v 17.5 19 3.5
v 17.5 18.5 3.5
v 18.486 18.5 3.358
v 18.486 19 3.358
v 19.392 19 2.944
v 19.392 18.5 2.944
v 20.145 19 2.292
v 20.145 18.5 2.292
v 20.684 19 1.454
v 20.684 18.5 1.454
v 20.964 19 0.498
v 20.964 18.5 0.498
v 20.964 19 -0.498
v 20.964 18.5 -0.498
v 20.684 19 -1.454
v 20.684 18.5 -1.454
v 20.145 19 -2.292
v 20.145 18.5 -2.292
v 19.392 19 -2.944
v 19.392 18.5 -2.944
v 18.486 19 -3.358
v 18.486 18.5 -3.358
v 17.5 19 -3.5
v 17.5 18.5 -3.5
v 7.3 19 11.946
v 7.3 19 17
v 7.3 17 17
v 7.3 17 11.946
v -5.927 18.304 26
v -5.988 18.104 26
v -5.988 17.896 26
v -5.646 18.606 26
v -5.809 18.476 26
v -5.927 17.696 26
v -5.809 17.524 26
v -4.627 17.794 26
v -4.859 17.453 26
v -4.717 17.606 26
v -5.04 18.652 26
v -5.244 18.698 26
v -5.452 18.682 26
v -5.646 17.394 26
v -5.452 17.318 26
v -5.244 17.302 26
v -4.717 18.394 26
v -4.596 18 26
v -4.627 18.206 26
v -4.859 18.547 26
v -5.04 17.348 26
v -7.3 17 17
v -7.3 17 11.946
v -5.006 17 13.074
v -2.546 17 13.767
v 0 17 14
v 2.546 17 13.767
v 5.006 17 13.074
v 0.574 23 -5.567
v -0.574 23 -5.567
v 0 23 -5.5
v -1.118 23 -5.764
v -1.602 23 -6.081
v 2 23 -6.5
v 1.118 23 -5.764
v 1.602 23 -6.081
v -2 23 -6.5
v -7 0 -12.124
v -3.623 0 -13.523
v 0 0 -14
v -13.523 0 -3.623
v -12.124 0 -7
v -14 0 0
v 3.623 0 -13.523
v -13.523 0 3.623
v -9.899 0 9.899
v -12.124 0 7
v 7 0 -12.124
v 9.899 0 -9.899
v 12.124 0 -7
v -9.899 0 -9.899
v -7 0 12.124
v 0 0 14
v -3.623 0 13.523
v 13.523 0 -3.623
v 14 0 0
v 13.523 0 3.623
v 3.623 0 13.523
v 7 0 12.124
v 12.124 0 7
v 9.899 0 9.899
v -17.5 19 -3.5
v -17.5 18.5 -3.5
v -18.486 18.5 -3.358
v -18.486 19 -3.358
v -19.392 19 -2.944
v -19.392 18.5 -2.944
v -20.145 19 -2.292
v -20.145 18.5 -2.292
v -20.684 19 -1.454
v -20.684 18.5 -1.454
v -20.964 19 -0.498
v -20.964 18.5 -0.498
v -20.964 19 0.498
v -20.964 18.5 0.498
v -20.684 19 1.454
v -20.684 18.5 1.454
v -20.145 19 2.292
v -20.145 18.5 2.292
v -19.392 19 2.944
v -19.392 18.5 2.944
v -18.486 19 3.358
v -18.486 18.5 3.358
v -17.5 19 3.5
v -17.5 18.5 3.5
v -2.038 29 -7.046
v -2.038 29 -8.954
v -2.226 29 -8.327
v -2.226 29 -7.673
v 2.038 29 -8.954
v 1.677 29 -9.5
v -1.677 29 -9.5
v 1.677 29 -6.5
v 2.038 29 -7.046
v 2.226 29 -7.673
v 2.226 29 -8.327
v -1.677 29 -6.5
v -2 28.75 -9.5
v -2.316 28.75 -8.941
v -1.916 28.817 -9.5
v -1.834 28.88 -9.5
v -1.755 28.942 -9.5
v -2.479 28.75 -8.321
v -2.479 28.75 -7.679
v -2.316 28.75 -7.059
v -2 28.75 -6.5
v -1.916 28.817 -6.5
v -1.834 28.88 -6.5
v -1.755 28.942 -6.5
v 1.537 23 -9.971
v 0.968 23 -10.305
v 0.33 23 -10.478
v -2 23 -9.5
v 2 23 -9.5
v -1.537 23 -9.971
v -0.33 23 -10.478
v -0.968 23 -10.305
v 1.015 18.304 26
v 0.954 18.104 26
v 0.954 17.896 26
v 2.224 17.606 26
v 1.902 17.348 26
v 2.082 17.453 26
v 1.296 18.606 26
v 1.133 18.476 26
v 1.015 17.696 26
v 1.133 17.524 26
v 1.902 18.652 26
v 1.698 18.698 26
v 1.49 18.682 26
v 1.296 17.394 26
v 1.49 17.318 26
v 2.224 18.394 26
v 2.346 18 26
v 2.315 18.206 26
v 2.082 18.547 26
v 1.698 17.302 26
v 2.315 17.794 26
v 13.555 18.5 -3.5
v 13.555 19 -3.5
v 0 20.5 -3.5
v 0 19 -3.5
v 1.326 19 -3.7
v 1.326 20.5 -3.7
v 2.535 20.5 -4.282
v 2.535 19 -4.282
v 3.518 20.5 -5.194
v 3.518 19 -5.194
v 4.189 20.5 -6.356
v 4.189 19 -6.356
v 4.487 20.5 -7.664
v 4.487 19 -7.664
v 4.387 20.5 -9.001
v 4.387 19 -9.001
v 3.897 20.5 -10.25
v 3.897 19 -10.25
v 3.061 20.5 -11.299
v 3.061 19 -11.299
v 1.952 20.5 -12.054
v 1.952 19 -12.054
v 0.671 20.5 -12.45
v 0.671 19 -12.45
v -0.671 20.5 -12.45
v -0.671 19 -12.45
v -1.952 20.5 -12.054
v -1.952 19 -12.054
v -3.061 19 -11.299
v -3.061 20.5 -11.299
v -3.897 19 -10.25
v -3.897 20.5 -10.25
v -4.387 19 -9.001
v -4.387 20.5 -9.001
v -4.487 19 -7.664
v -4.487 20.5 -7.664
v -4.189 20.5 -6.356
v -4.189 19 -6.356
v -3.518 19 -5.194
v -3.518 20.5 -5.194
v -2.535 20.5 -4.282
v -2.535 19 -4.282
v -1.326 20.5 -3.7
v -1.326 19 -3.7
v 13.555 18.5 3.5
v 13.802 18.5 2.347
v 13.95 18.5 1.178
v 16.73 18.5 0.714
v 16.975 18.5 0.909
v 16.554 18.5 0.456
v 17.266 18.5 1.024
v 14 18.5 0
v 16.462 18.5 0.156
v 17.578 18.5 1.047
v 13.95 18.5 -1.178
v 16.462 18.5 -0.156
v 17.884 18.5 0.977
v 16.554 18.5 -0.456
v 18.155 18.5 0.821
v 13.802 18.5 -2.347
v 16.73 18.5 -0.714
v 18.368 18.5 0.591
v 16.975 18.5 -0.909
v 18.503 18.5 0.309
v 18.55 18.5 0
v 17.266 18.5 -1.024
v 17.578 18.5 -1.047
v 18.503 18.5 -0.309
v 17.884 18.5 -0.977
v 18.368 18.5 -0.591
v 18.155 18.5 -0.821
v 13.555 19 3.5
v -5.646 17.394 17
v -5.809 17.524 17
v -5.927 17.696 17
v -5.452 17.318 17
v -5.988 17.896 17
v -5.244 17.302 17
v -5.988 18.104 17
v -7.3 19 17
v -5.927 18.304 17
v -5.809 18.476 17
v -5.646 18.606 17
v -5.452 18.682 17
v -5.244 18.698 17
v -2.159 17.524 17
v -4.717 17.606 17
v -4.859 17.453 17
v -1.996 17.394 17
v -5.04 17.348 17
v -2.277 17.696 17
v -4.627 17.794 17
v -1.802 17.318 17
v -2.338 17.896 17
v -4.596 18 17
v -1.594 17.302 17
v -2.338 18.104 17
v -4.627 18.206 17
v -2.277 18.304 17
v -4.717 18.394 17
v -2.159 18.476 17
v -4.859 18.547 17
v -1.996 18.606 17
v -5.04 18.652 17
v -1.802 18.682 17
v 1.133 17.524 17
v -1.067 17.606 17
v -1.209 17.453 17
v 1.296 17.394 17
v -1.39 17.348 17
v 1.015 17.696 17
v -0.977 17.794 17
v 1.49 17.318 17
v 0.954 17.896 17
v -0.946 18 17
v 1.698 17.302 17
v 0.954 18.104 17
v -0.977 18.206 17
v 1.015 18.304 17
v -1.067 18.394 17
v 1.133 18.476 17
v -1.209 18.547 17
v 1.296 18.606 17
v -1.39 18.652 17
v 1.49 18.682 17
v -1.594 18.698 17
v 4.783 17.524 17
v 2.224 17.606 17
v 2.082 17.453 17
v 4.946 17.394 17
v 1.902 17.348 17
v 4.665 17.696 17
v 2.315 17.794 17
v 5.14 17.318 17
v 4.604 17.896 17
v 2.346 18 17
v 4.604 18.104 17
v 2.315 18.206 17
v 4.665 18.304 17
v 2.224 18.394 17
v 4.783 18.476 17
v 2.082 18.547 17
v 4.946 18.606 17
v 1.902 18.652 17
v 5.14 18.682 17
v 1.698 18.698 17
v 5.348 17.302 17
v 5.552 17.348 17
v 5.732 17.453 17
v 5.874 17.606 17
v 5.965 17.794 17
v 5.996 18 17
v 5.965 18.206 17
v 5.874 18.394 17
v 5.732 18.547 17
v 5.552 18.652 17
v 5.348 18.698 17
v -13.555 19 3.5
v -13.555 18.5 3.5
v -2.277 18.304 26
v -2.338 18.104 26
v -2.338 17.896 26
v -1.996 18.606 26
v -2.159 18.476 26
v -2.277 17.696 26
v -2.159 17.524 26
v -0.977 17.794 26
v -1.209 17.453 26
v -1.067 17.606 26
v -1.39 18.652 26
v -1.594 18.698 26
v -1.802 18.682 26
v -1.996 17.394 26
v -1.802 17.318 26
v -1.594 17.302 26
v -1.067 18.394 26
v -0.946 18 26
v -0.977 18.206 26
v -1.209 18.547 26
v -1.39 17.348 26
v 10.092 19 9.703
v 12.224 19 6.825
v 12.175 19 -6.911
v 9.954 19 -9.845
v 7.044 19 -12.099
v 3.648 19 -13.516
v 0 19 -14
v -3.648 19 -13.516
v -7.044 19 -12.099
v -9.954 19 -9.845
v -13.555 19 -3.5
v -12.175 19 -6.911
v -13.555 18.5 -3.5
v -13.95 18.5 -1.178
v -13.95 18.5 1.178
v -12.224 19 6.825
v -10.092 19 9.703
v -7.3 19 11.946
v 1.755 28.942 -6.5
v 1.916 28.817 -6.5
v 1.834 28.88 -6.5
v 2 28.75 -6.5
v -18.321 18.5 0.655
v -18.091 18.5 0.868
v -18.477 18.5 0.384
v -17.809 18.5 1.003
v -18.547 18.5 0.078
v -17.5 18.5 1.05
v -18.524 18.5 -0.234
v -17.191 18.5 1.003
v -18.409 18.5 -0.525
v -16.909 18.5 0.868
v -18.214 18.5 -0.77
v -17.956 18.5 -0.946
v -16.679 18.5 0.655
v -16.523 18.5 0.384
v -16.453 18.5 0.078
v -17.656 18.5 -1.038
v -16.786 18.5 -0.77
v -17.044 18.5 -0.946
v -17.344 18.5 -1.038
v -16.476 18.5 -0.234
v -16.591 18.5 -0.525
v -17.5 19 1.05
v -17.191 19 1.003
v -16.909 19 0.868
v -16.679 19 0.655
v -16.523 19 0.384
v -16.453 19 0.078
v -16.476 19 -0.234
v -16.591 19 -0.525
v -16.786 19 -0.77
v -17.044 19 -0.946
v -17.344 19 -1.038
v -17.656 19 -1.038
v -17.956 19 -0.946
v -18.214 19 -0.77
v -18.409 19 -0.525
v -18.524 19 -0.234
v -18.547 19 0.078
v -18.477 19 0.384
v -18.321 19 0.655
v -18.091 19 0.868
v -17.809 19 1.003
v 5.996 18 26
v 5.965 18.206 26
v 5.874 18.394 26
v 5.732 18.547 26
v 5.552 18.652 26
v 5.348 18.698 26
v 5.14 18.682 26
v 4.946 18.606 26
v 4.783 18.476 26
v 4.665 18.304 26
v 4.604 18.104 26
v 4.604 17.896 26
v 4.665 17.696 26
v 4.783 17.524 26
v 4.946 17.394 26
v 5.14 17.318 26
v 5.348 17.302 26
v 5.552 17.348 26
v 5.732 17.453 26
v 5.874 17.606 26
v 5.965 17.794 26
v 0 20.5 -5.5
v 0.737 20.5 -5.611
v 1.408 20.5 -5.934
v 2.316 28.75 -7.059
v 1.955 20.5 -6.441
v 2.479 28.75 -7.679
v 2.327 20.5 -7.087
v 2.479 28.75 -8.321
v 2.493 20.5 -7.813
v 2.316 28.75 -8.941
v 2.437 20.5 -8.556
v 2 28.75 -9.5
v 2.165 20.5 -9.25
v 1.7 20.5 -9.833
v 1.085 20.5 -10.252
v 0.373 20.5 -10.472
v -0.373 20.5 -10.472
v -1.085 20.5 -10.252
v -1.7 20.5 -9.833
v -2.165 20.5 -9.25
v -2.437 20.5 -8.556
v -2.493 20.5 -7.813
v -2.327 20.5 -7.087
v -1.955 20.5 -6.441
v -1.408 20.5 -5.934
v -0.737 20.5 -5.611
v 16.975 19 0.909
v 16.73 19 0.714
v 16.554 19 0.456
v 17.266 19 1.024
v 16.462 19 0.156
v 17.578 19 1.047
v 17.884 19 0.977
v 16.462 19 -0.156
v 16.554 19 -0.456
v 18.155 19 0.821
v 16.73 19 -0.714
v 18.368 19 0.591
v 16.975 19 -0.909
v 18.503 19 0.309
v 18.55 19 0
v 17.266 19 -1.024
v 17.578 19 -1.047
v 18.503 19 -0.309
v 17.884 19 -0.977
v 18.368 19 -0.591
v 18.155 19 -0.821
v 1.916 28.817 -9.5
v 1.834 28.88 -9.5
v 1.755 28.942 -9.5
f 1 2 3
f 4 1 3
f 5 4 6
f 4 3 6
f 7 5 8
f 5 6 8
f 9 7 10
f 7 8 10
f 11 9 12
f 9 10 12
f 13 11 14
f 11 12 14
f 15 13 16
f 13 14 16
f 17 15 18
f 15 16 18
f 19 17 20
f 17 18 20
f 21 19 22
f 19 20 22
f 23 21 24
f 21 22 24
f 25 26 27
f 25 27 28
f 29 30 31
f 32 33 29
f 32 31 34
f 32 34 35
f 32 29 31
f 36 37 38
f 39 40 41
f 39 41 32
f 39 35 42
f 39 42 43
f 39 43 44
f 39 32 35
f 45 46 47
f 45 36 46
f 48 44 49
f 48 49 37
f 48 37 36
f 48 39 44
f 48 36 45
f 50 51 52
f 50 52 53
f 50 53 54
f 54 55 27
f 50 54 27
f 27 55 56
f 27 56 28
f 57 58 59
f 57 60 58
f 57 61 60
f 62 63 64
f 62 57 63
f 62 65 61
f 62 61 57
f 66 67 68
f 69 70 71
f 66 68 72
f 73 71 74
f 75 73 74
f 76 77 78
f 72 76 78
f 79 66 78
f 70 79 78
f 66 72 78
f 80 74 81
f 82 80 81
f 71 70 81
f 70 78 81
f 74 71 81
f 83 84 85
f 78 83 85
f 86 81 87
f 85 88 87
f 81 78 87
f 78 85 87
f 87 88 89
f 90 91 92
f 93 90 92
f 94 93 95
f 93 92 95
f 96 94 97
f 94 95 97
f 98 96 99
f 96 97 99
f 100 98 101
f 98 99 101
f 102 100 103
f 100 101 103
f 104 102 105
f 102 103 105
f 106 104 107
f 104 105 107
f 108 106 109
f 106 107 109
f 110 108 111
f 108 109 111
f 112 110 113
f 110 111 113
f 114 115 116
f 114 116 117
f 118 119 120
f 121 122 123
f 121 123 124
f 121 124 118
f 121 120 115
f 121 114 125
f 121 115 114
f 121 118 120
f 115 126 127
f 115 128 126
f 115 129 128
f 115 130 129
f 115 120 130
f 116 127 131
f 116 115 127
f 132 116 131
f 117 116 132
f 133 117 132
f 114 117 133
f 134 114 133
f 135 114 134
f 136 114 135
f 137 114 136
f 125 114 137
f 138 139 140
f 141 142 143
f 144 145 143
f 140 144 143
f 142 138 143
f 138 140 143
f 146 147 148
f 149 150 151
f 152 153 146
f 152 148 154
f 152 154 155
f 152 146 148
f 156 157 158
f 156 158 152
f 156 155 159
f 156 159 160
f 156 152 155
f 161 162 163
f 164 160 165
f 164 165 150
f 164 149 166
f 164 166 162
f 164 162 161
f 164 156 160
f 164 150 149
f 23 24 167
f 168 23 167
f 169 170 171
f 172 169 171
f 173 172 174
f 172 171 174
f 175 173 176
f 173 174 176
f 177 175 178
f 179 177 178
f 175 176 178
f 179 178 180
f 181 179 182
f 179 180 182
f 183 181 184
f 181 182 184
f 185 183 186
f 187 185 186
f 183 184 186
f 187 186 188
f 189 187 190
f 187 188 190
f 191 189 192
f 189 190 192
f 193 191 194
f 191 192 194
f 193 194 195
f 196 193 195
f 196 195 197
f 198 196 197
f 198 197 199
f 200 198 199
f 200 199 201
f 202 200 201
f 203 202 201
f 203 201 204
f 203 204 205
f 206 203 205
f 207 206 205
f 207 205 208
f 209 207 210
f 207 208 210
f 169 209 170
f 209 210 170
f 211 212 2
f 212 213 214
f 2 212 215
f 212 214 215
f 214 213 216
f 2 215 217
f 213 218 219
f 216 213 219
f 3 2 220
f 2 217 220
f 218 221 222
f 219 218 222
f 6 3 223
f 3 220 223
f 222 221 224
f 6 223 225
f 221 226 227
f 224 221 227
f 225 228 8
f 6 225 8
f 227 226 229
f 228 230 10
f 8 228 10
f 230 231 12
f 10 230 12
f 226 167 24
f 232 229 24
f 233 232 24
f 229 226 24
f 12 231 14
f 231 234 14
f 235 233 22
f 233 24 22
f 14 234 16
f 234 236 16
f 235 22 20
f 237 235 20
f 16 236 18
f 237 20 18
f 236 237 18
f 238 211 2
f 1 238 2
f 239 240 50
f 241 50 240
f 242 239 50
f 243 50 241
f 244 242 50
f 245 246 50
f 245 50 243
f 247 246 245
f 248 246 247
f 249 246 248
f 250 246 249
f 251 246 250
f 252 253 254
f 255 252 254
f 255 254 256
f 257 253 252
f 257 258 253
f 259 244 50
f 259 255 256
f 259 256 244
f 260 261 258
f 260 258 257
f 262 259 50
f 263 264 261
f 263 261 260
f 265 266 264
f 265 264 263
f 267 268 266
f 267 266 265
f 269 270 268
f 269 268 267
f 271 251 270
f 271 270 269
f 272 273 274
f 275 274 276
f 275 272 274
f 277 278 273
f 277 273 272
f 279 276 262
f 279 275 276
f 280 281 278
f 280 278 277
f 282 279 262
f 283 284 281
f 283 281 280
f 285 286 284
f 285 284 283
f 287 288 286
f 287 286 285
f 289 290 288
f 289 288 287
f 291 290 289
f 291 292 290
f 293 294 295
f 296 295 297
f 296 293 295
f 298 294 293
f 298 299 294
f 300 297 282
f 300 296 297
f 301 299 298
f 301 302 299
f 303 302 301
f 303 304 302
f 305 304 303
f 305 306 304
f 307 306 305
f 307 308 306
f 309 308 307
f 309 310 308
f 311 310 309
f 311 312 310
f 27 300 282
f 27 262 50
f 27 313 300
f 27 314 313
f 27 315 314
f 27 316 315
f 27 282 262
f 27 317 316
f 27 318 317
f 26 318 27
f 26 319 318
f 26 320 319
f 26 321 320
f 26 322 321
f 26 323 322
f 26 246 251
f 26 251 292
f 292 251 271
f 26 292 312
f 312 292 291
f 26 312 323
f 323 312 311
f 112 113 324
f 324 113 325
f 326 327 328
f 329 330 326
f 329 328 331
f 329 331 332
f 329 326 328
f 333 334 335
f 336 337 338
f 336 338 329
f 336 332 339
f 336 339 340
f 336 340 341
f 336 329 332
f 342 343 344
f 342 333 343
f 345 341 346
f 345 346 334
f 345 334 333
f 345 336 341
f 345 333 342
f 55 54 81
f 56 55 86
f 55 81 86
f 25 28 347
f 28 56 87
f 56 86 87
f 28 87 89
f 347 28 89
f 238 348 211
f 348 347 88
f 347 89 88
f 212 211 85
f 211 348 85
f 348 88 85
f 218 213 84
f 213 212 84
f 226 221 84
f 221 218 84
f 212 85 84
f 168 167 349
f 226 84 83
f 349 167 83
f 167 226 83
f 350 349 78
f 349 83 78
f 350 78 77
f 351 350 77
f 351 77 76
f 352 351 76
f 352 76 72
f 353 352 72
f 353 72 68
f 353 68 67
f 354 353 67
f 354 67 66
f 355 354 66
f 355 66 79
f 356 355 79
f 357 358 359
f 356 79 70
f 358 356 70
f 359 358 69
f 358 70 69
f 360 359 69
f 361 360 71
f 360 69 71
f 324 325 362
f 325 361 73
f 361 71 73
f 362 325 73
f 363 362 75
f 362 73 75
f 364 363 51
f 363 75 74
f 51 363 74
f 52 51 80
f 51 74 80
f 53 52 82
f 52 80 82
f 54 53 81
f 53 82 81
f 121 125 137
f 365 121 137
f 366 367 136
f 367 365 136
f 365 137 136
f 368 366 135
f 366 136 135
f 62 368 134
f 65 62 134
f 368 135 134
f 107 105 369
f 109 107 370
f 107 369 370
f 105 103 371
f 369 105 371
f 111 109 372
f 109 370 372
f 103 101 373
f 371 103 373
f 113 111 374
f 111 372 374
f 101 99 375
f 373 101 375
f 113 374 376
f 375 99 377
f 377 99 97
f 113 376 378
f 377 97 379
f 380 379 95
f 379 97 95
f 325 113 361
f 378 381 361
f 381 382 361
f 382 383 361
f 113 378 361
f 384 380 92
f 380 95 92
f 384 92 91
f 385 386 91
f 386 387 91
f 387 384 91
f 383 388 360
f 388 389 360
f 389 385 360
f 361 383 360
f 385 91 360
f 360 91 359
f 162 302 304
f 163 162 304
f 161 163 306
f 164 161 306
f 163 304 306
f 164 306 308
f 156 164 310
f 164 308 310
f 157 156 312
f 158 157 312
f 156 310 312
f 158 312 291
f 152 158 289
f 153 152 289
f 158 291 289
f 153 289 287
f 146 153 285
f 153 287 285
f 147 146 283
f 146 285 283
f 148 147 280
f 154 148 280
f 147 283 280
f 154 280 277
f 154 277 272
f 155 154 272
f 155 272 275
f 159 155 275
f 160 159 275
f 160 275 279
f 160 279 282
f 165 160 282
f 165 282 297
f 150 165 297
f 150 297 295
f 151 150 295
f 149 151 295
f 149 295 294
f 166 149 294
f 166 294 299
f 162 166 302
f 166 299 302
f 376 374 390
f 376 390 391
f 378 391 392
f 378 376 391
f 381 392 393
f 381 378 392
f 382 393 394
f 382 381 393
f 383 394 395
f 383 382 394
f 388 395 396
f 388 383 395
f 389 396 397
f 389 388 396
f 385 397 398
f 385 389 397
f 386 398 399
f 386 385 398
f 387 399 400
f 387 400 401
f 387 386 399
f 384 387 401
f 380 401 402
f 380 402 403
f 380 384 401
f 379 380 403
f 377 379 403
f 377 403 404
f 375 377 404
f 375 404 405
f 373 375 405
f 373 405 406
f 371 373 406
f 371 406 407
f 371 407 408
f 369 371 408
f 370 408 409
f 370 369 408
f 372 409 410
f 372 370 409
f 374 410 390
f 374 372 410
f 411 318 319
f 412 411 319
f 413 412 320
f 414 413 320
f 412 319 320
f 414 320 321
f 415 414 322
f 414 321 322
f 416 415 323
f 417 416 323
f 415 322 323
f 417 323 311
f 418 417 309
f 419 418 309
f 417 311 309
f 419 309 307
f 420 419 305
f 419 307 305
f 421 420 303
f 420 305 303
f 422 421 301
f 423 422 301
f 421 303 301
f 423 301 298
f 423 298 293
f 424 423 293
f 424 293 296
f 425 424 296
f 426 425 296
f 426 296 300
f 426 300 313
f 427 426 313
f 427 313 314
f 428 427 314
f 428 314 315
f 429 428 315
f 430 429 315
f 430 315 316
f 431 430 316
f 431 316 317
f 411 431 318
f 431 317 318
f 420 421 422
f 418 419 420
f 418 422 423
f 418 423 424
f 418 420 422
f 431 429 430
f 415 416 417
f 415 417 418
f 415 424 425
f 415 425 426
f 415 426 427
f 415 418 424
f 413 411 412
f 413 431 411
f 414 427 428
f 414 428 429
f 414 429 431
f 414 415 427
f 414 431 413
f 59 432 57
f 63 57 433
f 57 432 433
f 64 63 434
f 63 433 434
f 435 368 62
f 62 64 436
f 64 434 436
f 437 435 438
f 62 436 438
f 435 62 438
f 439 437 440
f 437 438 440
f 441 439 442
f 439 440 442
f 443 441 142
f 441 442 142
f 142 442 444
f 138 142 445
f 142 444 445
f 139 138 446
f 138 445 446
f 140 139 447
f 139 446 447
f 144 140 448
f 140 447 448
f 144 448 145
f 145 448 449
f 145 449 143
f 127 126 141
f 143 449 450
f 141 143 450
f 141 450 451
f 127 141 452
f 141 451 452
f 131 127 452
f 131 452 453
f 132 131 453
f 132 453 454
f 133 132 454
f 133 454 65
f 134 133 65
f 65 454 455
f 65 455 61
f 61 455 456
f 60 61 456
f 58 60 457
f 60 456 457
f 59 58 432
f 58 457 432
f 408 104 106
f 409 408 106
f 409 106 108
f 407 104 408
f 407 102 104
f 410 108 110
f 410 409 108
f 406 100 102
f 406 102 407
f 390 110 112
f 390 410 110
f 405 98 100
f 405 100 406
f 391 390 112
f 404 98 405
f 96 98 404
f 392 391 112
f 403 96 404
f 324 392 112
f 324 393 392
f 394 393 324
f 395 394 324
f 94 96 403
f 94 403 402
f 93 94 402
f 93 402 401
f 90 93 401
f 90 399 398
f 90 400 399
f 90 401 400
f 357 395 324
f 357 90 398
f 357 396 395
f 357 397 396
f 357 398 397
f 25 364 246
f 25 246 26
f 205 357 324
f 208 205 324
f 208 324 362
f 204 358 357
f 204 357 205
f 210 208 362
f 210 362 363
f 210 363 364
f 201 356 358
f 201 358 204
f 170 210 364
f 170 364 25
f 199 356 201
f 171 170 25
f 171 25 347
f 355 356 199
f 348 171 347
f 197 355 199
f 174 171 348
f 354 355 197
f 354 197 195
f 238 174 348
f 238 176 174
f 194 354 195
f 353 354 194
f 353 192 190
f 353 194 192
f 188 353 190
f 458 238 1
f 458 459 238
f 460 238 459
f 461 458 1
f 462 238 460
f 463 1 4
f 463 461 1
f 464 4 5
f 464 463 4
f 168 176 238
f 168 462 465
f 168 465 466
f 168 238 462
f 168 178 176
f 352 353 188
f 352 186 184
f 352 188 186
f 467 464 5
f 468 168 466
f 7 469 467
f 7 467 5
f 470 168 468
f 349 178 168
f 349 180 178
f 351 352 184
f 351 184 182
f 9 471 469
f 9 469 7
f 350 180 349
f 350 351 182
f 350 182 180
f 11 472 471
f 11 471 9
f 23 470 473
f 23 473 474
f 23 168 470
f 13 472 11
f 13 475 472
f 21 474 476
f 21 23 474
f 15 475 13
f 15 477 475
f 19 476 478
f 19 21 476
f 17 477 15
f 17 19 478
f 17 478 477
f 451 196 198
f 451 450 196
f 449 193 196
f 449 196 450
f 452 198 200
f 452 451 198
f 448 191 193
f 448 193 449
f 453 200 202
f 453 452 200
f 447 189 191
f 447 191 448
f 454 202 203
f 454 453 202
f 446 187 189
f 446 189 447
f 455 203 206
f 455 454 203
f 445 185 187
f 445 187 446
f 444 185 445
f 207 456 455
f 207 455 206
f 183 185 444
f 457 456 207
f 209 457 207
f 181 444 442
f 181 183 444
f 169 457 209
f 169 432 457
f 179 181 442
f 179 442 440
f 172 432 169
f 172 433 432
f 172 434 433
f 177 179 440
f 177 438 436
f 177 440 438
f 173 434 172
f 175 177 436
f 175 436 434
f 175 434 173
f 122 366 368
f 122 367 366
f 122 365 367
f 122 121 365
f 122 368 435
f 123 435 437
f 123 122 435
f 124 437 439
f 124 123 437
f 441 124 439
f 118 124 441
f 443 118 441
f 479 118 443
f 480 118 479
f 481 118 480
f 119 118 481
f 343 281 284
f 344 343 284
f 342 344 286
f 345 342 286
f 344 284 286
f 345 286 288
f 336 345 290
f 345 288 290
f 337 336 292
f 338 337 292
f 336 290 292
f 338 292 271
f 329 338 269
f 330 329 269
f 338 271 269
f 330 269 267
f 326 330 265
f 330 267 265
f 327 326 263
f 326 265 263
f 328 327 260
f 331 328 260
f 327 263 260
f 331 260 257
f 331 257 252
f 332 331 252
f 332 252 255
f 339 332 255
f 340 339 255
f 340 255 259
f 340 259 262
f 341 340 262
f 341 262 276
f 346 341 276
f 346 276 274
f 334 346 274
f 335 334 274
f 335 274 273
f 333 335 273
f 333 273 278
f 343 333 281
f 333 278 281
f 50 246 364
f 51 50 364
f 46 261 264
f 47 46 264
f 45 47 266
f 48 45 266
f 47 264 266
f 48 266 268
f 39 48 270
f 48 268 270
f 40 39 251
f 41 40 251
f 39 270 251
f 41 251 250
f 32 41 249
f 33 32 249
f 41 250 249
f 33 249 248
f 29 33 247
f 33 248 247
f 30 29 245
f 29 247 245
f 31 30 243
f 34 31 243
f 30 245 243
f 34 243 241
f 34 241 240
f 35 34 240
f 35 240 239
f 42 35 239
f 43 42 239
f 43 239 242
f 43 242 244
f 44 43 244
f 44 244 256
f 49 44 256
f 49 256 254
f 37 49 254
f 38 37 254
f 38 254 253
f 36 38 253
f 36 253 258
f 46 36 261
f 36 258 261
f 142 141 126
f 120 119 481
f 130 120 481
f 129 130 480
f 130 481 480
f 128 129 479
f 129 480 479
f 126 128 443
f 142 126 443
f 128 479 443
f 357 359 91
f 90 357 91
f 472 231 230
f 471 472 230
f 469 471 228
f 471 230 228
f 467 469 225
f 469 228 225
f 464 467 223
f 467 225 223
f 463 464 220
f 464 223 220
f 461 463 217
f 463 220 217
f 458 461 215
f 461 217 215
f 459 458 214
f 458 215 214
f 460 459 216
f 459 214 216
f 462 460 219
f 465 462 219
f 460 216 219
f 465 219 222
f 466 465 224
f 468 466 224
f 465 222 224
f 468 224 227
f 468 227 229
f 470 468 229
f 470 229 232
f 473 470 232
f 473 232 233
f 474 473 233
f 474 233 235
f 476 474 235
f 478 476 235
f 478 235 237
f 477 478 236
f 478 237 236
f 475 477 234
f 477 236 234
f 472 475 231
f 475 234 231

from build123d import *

# Parameters (mm, degrees)
SKETCH1_R           = 14
BOSS_EXTRUDE1_DEPTH = 19
SKETCH2_R           = 4.5
BOSS_EXTRUDE2_DEPTH = 1.5
SKETCH3_R           = 2.5
BOSS_EXTRUDE3_DEPTH = 2.5
SKETCH4_R           = 2.5
BOSS_EXTRUDE4_DEPTH = 6
CHAMFER1_SIZE       = 0.25
BOSS_EXTRUDE5_START = -0.5
SKETCH6_R           = 1.05
BOSS_EXTRUDE5_DEPTH = 0.5
CUT_EXTRUDE1_DEPTH  = 6
SKETCH8_W           = 14.6
SKETCH8_H           = 17
BOSS_EXTRUDE6_DEPTH = 2
SKETCH9_R           = 0.7
BOSS_EXTRUDE7_DEPTH = 9


with BuildPart() as part:
    # Sketch1 → Boss-Extrude1 (new body)
    with BuildSketch(Plane(origin=(0, 0, 0), x_dir=(1, 0, 0), z_dir=(0, 1, 0))):
        with Locations(Location((0, 0, 0), (0, 0, 270))):
            Circle(SKETCH1_R)
    extrude(amount=BOSS_EXTRUDE1_DEPTH)

    # Sketch2 → Boss-Extrude2 (add)
    with BuildSketch(Plane(origin=(0, 19, 0), x_dir=(1, 0, 0), z_dir=(0, 1, 0))):
        with Locations(Location((0, 8, 0), (0, 0, 270))):
            Circle(SKETCH2_R)
    extrude(amount=BOSS_EXTRUDE2_DEPTH)

    # Sketch3 → Boss-Extrude3 (add)
    with BuildSketch(Plane(origin=(0, 20.5, 0), x_dir=(1, 0, 0), z_dir=(0, 1, 0))):
        with Locations(Location((0, 8, 0), (0, 0, 270))):
            Circle(SKETCH3_R)
    extrude(amount=BOSS_EXTRUDE3_DEPTH)

    # Sketch4 → Boss-Extrude4 (add)
    with BuildSketch(Plane(origin=(0, 23, 0), x_dir=(1, 0, 0), z_dir=(0, 1, 0))):
        with Locations(Location((0, 8, 0), (0, 0, 270))):
            Circle(SKETCH4_R)
    extrude(amount=BOSS_EXTRUDE4_DEPTH)

    # Chamfer1
    chamfer1_edges = [part.edges().sort_by_distance(p)[0] for p in [
        (0, 29, -10.5),
    ]]
    chamfer(chamfer1_edges, length=CHAMFER1_SIZE)

    # Sketch6 → Boss-Extrude5 (add)
    # profile 1 of 2: a face of its own
    with BuildSketch(Plane(origin=(0, 19, 0), x_dir=(1, 0, 0), z_dir=(0, 1, 0)).offset(BOSS_EXTRUDE5_START)):
        with BuildLine():
            Line((-13.555441712, 3.5), (-17.5, 3.5))
            ThreePointArc((-17.5, 3.5), (-21, 0), (-17.5, -3.5))
            Line((-17.5, -3.5), (-13.555441712, -3.5))
            ThreePointArc((-13.555441712, -3.5), (-14, 0), (-13.555441712, 3.5))
        make_face()
        with Locations(Location((-17.5, 0, 0), (0, 0, 270))):
            Circle(SKETCH6_R, mode=Mode.SUBTRACT)
    # profile 2 of 2: a face of its own
    with BuildSketch(Plane(origin=(0, 19, 0), x_dir=(1, 0, 0), z_dir=(0, 1, 0)).offset(BOSS_EXTRUDE5_START)):
        with BuildLine():
            Line((17.5, 3.5), (13.555441712, 3.5))
            ThreePointArc((13.555441712, 3.5), (13.888415748, 1.764060095), (14, 0))
            ThreePointArc((14, 0), (13.888415748, -1.764060095), (13.555441712, -3.5))
            Line((13.555441712, -3.5), (17.5, -3.5))
            ThreePointArc((17.5, -3.5), (21, 0), (17.5, 3.5))
        make_face()
        with BuildLine():
            ThreePointArc((16.45, 0), (17.5, 1.05), (18.55, 0))
            ThreePointArc((18.55, 0), (17.5, -1.05), (16.45, 0))
        make_face(mode=Mode.SUBTRACT)
    extrude(amount=BOSS_EXTRUDE5_DEPTH)

    # Sketch7 → Cut-Extrude1 (cut)
    with BuildSketch(Plane(origin=(0, 29, 0), x_dir=(1, 0, 0), z_dir=(0, 1, 0))):
        Polygon((0, 9.5), (-3.852733209, 9.5), (-3.852733209, 12.808282557), (3.692444336, 12.808282557), (3.692444336, 9.5), align=None)
        Polygon((3.692444336, 6.5), (0, 6.5), (-3.852733209, 6.5), (-3.852733209, 3.191717443), (3.692444336, 3.191717443), align=None)
    extrude(amount=-CUT_EXTRUDE1_DEPTH, mode=Mode.SUBTRACT)

    # Sketch8 → Boss-Extrude6 (add)
    with BuildSketch(Plane(origin=(0, 19, 0), x_dir=(1, 0, 0), z_dir=(0, 1, 0))):
        with Locations((0, -8.5)):
            Rectangle(SKETCH8_W, SKETCH8_H)
    extrude(amount=-BOSS_EXTRUDE6_DEPTH)

    # Sketch9 → Boss-Extrude7 (add)
    with BuildSketch(Plane.XY.offset(17)):
        with Locations((-1.645828478, 18)):
            Circle(SKETCH9_R)
        with Locations((1.645828478, 18)):
            Circle(SKETCH9_R)
        with Locations((5.295828478, 18)):
            Circle(SKETCH9_R)
        with Locations((-5.295828478, 18)):
            Circle(SKETCH9_R)
    extrude(amount=BOSS_EXTRUDE7_DEPTH)


solid = part.part
